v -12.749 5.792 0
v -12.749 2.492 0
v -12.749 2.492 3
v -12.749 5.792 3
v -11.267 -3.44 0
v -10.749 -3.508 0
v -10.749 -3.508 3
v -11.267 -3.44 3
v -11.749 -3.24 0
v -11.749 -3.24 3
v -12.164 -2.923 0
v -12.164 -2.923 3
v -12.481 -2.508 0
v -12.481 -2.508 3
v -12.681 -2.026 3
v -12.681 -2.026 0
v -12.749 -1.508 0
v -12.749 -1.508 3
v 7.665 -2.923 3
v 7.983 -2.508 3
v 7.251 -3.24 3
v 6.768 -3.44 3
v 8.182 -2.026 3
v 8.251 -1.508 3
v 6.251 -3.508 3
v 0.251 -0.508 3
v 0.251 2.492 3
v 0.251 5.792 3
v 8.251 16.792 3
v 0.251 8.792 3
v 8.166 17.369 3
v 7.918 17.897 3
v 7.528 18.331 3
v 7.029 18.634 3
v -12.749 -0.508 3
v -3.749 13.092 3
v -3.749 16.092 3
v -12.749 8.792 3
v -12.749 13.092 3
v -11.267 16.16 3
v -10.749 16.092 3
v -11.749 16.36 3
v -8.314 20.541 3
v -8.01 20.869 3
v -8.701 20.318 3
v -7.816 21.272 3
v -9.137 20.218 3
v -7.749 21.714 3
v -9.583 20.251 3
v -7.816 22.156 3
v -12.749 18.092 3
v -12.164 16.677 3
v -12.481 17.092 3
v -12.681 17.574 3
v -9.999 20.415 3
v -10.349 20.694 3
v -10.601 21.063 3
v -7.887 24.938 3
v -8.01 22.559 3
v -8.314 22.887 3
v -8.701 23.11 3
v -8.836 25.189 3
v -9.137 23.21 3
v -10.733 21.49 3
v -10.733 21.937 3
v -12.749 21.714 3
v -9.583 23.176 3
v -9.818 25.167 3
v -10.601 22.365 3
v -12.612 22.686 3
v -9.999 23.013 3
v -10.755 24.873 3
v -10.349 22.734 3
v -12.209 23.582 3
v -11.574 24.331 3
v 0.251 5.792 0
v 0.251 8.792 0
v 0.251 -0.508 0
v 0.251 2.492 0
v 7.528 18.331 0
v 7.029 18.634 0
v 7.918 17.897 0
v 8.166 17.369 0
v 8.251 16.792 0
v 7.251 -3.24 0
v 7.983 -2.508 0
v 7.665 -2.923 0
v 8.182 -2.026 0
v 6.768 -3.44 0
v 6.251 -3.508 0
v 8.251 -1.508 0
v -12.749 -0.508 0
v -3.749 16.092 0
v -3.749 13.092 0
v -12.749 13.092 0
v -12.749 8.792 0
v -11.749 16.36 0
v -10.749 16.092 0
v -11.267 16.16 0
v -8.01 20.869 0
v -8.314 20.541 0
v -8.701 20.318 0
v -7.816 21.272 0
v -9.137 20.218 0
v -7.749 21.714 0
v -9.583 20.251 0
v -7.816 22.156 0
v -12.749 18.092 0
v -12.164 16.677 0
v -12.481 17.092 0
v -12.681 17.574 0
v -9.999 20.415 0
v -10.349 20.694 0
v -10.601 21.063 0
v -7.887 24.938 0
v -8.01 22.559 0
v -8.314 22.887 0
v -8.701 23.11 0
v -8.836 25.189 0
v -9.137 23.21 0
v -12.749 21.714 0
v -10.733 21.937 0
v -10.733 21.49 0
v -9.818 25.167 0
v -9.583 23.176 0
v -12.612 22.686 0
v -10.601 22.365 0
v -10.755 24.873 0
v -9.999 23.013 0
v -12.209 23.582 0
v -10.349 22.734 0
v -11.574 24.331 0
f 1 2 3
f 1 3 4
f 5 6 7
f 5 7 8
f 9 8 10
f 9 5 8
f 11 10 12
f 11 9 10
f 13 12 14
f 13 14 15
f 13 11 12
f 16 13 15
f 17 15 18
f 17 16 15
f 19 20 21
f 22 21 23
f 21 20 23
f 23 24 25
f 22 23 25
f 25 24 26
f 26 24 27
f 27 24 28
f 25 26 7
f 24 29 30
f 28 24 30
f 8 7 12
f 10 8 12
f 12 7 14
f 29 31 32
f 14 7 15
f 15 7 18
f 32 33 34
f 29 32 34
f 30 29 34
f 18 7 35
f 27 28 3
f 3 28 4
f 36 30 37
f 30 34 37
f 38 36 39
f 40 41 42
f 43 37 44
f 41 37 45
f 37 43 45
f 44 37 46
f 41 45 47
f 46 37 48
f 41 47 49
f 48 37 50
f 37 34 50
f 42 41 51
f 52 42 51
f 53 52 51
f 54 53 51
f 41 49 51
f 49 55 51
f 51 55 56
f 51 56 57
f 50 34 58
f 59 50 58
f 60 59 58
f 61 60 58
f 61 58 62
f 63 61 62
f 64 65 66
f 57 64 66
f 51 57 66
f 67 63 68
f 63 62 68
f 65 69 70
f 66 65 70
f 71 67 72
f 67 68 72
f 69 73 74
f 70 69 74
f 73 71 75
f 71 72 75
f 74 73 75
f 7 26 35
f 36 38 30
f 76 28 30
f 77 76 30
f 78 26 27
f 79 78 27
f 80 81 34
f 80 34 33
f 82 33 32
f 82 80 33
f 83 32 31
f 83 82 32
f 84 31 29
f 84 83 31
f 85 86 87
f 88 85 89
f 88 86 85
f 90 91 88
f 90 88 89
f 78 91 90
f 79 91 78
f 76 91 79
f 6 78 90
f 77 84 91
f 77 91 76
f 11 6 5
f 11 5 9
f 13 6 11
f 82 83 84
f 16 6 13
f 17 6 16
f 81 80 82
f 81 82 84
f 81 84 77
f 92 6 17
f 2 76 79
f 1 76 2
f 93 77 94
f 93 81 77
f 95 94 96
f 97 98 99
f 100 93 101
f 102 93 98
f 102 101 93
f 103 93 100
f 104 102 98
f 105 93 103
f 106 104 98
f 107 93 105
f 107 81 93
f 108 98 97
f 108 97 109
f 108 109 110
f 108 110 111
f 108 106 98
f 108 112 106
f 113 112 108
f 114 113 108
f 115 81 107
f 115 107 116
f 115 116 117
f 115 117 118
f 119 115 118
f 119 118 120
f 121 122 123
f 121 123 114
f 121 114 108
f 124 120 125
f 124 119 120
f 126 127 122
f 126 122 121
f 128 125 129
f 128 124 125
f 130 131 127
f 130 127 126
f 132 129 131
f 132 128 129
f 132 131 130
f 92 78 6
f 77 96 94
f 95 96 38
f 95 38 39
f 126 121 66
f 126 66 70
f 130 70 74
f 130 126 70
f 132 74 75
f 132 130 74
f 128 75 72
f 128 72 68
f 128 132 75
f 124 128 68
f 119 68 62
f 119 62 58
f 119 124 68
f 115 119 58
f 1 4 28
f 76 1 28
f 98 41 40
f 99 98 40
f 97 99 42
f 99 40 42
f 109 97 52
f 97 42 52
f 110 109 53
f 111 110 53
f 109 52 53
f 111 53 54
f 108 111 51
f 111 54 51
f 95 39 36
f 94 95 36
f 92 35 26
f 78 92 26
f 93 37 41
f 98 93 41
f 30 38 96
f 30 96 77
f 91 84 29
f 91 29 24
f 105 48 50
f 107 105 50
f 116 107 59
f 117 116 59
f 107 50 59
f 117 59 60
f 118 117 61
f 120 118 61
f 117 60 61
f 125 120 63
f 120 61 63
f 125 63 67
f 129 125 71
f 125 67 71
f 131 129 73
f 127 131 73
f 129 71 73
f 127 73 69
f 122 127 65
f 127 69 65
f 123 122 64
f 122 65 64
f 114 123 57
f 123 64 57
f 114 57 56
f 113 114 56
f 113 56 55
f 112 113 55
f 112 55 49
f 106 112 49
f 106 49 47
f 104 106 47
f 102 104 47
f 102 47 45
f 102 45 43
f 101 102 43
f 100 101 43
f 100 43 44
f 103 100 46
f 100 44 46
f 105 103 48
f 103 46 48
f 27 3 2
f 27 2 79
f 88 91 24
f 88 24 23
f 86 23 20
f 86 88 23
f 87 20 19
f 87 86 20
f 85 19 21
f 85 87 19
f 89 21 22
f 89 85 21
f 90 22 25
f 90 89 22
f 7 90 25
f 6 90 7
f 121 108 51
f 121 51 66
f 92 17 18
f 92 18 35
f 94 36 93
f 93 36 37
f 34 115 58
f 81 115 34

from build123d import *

# Parameters (mm, degrees)
BOSS_EXTRUDE1_DEPTH = 3
SKETCH4_W           = 13
SKETCH4_H           = 3
CUT_EXTRUDE1_DEPTH  = 3
SKETCH5_R           = 1.5
CUT_EXTRUDE2_DEPTH  = 3


with BuildPart() as part:
    # Sketch2 → Boss-Extrude1 (new body)
    with BuildSketch(Plane.XY):
        with BuildLine():
            Line((8.250612211, 16.791600065), (8.250612211, -1.508399935))
            ThreePointArc((8.250612211, -1.508399935), (7.664825773, -2.922613498), (6.250612211, -3.508399935))
            Line((6.250612211, -3.508399935), (-10.749387789, -3.508399935))
            ThreePointArc((-10.749387789, -3.508399935), (-12.163601352, -2.922613498), (-12.749387789, -1.508399935))
            Line((-12.749387789, -1.508399935), (-12.749387789, 21.713833017))
            ThreePointArc((-12.749387789, 21.713833017), (-11.183455157, 24.630917763), (-7.886882979, 24.937740684))
            Line((-7.886882979, 24.937740684), (7.029186388, 18.633833017))
            ThreePointArc((7.029186388, 18.633833017), (7.91751778, 17.896781418), (8.250612211, 16.791600065))
        make_face()
    extrude(amount=BOSS_EXTRUDE1_DEPTH)

    # Sketch4 → Cut-Extrude1 (cut)
    with BuildSketch(Plane.XY.offset(3)):
        with BuildLine():
            Line((-12.749387789, 13.091600065), (-3.749387789, 13.091600065))
            Line((-3.749387789, 13.091600065), (-3.749387789, 16.091600065))
            Line((-3.749387789, 16.091600065), (-10.749387789, 16.091600065))
            ThreePointArc((-10.749387789, 16.091600065), (-12.163601352, 16.677386502), (-12.749387789, 18.091600065))
            Line((-12.749387789, 18.091600065), (-12.749387789, 13.091600065))
        make_face()
        with Locations((-6.249387789, 7.291600065)):
            Rectangle(SKETCH4_W, SKETCH4_H)
        with Locations((-6.249387789, 0.991600065)):
            Rectangle(SKETCH4_W, SKETCH4_H)
    extrude(amount=-CUT_EXTRUDE1_DEPTH, mode=Mode.SUBTRACT)

    # Sketch5 → Cut-Extrude2 (cut)
    with BuildSketch(Plane.XY.offset(3)):
        with Locations((-9.249387789, 21.713833017)):
            Circle(SKETCH5_R)
    extrude(amount=-CUT_EXTRUDE2_DEPTH, mode=Mode.SUBTRACT)


solid = part.part
